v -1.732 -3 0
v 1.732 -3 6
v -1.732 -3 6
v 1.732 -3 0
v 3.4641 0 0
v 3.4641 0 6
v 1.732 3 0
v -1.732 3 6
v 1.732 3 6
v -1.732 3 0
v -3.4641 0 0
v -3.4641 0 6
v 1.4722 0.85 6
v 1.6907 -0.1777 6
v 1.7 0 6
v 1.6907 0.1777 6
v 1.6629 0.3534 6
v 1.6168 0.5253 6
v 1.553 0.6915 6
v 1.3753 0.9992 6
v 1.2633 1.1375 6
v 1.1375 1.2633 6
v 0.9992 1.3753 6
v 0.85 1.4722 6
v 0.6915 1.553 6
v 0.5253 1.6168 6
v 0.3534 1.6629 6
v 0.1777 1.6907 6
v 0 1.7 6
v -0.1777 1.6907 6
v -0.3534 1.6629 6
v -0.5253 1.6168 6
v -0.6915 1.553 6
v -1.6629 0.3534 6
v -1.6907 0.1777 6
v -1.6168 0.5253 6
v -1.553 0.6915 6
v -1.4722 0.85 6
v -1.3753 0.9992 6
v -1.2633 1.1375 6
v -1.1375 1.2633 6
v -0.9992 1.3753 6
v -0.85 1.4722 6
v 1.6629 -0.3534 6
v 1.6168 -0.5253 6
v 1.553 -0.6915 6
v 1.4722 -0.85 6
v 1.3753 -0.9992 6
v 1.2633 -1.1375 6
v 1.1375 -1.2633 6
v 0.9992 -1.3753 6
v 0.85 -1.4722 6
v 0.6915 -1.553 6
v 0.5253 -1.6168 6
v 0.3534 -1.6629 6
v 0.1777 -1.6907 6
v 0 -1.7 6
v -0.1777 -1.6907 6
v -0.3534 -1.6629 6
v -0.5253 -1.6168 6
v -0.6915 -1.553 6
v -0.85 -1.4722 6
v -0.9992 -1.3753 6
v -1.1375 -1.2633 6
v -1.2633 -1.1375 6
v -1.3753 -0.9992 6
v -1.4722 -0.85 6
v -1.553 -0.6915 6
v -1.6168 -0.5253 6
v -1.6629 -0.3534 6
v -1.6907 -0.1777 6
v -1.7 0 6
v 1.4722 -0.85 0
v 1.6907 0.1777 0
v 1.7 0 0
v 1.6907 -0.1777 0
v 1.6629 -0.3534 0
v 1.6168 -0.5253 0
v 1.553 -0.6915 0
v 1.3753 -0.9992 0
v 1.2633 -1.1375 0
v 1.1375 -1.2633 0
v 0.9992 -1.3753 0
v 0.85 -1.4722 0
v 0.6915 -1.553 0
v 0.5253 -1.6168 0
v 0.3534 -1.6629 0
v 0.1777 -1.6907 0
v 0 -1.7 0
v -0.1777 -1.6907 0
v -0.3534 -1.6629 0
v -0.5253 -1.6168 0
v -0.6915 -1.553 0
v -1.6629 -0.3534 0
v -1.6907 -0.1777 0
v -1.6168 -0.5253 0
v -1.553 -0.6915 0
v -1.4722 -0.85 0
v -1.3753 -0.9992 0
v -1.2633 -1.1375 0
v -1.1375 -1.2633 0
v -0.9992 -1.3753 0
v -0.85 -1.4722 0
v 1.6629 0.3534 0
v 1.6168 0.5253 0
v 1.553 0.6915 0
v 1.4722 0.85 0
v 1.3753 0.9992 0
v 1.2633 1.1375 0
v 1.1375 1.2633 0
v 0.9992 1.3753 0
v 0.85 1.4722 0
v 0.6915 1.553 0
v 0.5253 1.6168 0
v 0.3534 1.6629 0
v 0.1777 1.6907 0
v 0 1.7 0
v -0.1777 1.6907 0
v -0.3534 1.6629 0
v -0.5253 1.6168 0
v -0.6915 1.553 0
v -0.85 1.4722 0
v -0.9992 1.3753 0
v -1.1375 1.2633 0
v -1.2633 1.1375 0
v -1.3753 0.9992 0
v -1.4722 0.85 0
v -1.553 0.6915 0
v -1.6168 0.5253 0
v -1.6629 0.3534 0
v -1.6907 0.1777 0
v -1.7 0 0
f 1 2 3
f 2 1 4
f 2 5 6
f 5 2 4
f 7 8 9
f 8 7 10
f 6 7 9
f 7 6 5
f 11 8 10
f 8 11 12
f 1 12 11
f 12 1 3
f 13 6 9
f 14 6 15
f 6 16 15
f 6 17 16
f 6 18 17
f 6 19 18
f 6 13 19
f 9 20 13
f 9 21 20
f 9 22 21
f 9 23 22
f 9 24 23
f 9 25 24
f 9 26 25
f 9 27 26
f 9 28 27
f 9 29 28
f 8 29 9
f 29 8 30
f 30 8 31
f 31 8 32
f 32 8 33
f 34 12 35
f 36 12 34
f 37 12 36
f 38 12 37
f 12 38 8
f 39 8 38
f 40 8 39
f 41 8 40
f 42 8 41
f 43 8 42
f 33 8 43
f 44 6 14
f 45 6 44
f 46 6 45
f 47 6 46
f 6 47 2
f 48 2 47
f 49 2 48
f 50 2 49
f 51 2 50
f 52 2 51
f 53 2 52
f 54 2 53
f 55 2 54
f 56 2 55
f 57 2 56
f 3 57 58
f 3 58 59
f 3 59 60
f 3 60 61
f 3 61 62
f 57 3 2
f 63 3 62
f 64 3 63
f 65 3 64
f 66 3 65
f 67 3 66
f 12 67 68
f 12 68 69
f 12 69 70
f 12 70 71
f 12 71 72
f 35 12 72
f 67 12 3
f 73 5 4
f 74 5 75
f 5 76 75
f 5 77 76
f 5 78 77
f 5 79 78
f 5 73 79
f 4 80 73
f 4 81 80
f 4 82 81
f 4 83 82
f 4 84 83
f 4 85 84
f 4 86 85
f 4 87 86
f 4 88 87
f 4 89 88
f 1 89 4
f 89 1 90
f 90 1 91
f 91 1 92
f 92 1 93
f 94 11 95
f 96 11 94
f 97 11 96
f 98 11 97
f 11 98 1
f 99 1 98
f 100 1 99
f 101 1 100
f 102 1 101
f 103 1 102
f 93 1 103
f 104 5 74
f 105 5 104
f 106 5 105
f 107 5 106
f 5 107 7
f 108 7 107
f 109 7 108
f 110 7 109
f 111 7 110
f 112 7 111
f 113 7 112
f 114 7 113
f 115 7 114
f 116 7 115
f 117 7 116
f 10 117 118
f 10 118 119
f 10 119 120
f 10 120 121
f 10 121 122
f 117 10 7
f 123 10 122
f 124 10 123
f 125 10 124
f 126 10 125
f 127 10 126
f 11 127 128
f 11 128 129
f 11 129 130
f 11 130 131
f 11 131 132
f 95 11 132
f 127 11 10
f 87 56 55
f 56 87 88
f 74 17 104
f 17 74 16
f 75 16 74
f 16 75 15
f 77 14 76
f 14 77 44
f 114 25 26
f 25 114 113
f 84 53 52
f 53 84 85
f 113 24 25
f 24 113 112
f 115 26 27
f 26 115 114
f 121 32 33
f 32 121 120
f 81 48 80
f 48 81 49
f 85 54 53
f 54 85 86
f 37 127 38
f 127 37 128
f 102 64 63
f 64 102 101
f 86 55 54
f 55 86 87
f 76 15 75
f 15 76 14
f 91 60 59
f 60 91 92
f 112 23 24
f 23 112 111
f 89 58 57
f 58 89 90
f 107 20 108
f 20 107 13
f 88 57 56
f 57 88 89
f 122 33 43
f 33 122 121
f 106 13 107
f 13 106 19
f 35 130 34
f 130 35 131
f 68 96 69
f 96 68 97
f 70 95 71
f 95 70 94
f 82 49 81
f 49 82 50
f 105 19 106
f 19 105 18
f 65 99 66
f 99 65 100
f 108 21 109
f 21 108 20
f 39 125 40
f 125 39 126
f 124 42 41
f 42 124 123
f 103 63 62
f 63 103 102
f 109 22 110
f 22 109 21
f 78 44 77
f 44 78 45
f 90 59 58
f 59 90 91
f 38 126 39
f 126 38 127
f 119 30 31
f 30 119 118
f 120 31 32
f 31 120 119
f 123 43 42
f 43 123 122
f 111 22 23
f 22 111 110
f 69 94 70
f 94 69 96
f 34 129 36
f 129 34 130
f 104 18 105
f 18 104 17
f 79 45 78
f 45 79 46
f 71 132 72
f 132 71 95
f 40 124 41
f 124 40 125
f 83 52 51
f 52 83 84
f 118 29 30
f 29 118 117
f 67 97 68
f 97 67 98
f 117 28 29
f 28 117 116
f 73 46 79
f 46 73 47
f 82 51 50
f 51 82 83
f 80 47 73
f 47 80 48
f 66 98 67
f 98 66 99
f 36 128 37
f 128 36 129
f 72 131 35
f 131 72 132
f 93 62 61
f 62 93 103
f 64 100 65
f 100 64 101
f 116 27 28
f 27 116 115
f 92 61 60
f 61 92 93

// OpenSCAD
// Hex spacer.
$fn = 60;
eps = 0.02;
inner_d = 3.4;
flat = 6;
length = 6;
difference() { cylinder(d=flat/cos(30),h=length,$fn=6); translate([0,0,-eps]) cylinder(d=inner_d,h=length+2*eps); }
